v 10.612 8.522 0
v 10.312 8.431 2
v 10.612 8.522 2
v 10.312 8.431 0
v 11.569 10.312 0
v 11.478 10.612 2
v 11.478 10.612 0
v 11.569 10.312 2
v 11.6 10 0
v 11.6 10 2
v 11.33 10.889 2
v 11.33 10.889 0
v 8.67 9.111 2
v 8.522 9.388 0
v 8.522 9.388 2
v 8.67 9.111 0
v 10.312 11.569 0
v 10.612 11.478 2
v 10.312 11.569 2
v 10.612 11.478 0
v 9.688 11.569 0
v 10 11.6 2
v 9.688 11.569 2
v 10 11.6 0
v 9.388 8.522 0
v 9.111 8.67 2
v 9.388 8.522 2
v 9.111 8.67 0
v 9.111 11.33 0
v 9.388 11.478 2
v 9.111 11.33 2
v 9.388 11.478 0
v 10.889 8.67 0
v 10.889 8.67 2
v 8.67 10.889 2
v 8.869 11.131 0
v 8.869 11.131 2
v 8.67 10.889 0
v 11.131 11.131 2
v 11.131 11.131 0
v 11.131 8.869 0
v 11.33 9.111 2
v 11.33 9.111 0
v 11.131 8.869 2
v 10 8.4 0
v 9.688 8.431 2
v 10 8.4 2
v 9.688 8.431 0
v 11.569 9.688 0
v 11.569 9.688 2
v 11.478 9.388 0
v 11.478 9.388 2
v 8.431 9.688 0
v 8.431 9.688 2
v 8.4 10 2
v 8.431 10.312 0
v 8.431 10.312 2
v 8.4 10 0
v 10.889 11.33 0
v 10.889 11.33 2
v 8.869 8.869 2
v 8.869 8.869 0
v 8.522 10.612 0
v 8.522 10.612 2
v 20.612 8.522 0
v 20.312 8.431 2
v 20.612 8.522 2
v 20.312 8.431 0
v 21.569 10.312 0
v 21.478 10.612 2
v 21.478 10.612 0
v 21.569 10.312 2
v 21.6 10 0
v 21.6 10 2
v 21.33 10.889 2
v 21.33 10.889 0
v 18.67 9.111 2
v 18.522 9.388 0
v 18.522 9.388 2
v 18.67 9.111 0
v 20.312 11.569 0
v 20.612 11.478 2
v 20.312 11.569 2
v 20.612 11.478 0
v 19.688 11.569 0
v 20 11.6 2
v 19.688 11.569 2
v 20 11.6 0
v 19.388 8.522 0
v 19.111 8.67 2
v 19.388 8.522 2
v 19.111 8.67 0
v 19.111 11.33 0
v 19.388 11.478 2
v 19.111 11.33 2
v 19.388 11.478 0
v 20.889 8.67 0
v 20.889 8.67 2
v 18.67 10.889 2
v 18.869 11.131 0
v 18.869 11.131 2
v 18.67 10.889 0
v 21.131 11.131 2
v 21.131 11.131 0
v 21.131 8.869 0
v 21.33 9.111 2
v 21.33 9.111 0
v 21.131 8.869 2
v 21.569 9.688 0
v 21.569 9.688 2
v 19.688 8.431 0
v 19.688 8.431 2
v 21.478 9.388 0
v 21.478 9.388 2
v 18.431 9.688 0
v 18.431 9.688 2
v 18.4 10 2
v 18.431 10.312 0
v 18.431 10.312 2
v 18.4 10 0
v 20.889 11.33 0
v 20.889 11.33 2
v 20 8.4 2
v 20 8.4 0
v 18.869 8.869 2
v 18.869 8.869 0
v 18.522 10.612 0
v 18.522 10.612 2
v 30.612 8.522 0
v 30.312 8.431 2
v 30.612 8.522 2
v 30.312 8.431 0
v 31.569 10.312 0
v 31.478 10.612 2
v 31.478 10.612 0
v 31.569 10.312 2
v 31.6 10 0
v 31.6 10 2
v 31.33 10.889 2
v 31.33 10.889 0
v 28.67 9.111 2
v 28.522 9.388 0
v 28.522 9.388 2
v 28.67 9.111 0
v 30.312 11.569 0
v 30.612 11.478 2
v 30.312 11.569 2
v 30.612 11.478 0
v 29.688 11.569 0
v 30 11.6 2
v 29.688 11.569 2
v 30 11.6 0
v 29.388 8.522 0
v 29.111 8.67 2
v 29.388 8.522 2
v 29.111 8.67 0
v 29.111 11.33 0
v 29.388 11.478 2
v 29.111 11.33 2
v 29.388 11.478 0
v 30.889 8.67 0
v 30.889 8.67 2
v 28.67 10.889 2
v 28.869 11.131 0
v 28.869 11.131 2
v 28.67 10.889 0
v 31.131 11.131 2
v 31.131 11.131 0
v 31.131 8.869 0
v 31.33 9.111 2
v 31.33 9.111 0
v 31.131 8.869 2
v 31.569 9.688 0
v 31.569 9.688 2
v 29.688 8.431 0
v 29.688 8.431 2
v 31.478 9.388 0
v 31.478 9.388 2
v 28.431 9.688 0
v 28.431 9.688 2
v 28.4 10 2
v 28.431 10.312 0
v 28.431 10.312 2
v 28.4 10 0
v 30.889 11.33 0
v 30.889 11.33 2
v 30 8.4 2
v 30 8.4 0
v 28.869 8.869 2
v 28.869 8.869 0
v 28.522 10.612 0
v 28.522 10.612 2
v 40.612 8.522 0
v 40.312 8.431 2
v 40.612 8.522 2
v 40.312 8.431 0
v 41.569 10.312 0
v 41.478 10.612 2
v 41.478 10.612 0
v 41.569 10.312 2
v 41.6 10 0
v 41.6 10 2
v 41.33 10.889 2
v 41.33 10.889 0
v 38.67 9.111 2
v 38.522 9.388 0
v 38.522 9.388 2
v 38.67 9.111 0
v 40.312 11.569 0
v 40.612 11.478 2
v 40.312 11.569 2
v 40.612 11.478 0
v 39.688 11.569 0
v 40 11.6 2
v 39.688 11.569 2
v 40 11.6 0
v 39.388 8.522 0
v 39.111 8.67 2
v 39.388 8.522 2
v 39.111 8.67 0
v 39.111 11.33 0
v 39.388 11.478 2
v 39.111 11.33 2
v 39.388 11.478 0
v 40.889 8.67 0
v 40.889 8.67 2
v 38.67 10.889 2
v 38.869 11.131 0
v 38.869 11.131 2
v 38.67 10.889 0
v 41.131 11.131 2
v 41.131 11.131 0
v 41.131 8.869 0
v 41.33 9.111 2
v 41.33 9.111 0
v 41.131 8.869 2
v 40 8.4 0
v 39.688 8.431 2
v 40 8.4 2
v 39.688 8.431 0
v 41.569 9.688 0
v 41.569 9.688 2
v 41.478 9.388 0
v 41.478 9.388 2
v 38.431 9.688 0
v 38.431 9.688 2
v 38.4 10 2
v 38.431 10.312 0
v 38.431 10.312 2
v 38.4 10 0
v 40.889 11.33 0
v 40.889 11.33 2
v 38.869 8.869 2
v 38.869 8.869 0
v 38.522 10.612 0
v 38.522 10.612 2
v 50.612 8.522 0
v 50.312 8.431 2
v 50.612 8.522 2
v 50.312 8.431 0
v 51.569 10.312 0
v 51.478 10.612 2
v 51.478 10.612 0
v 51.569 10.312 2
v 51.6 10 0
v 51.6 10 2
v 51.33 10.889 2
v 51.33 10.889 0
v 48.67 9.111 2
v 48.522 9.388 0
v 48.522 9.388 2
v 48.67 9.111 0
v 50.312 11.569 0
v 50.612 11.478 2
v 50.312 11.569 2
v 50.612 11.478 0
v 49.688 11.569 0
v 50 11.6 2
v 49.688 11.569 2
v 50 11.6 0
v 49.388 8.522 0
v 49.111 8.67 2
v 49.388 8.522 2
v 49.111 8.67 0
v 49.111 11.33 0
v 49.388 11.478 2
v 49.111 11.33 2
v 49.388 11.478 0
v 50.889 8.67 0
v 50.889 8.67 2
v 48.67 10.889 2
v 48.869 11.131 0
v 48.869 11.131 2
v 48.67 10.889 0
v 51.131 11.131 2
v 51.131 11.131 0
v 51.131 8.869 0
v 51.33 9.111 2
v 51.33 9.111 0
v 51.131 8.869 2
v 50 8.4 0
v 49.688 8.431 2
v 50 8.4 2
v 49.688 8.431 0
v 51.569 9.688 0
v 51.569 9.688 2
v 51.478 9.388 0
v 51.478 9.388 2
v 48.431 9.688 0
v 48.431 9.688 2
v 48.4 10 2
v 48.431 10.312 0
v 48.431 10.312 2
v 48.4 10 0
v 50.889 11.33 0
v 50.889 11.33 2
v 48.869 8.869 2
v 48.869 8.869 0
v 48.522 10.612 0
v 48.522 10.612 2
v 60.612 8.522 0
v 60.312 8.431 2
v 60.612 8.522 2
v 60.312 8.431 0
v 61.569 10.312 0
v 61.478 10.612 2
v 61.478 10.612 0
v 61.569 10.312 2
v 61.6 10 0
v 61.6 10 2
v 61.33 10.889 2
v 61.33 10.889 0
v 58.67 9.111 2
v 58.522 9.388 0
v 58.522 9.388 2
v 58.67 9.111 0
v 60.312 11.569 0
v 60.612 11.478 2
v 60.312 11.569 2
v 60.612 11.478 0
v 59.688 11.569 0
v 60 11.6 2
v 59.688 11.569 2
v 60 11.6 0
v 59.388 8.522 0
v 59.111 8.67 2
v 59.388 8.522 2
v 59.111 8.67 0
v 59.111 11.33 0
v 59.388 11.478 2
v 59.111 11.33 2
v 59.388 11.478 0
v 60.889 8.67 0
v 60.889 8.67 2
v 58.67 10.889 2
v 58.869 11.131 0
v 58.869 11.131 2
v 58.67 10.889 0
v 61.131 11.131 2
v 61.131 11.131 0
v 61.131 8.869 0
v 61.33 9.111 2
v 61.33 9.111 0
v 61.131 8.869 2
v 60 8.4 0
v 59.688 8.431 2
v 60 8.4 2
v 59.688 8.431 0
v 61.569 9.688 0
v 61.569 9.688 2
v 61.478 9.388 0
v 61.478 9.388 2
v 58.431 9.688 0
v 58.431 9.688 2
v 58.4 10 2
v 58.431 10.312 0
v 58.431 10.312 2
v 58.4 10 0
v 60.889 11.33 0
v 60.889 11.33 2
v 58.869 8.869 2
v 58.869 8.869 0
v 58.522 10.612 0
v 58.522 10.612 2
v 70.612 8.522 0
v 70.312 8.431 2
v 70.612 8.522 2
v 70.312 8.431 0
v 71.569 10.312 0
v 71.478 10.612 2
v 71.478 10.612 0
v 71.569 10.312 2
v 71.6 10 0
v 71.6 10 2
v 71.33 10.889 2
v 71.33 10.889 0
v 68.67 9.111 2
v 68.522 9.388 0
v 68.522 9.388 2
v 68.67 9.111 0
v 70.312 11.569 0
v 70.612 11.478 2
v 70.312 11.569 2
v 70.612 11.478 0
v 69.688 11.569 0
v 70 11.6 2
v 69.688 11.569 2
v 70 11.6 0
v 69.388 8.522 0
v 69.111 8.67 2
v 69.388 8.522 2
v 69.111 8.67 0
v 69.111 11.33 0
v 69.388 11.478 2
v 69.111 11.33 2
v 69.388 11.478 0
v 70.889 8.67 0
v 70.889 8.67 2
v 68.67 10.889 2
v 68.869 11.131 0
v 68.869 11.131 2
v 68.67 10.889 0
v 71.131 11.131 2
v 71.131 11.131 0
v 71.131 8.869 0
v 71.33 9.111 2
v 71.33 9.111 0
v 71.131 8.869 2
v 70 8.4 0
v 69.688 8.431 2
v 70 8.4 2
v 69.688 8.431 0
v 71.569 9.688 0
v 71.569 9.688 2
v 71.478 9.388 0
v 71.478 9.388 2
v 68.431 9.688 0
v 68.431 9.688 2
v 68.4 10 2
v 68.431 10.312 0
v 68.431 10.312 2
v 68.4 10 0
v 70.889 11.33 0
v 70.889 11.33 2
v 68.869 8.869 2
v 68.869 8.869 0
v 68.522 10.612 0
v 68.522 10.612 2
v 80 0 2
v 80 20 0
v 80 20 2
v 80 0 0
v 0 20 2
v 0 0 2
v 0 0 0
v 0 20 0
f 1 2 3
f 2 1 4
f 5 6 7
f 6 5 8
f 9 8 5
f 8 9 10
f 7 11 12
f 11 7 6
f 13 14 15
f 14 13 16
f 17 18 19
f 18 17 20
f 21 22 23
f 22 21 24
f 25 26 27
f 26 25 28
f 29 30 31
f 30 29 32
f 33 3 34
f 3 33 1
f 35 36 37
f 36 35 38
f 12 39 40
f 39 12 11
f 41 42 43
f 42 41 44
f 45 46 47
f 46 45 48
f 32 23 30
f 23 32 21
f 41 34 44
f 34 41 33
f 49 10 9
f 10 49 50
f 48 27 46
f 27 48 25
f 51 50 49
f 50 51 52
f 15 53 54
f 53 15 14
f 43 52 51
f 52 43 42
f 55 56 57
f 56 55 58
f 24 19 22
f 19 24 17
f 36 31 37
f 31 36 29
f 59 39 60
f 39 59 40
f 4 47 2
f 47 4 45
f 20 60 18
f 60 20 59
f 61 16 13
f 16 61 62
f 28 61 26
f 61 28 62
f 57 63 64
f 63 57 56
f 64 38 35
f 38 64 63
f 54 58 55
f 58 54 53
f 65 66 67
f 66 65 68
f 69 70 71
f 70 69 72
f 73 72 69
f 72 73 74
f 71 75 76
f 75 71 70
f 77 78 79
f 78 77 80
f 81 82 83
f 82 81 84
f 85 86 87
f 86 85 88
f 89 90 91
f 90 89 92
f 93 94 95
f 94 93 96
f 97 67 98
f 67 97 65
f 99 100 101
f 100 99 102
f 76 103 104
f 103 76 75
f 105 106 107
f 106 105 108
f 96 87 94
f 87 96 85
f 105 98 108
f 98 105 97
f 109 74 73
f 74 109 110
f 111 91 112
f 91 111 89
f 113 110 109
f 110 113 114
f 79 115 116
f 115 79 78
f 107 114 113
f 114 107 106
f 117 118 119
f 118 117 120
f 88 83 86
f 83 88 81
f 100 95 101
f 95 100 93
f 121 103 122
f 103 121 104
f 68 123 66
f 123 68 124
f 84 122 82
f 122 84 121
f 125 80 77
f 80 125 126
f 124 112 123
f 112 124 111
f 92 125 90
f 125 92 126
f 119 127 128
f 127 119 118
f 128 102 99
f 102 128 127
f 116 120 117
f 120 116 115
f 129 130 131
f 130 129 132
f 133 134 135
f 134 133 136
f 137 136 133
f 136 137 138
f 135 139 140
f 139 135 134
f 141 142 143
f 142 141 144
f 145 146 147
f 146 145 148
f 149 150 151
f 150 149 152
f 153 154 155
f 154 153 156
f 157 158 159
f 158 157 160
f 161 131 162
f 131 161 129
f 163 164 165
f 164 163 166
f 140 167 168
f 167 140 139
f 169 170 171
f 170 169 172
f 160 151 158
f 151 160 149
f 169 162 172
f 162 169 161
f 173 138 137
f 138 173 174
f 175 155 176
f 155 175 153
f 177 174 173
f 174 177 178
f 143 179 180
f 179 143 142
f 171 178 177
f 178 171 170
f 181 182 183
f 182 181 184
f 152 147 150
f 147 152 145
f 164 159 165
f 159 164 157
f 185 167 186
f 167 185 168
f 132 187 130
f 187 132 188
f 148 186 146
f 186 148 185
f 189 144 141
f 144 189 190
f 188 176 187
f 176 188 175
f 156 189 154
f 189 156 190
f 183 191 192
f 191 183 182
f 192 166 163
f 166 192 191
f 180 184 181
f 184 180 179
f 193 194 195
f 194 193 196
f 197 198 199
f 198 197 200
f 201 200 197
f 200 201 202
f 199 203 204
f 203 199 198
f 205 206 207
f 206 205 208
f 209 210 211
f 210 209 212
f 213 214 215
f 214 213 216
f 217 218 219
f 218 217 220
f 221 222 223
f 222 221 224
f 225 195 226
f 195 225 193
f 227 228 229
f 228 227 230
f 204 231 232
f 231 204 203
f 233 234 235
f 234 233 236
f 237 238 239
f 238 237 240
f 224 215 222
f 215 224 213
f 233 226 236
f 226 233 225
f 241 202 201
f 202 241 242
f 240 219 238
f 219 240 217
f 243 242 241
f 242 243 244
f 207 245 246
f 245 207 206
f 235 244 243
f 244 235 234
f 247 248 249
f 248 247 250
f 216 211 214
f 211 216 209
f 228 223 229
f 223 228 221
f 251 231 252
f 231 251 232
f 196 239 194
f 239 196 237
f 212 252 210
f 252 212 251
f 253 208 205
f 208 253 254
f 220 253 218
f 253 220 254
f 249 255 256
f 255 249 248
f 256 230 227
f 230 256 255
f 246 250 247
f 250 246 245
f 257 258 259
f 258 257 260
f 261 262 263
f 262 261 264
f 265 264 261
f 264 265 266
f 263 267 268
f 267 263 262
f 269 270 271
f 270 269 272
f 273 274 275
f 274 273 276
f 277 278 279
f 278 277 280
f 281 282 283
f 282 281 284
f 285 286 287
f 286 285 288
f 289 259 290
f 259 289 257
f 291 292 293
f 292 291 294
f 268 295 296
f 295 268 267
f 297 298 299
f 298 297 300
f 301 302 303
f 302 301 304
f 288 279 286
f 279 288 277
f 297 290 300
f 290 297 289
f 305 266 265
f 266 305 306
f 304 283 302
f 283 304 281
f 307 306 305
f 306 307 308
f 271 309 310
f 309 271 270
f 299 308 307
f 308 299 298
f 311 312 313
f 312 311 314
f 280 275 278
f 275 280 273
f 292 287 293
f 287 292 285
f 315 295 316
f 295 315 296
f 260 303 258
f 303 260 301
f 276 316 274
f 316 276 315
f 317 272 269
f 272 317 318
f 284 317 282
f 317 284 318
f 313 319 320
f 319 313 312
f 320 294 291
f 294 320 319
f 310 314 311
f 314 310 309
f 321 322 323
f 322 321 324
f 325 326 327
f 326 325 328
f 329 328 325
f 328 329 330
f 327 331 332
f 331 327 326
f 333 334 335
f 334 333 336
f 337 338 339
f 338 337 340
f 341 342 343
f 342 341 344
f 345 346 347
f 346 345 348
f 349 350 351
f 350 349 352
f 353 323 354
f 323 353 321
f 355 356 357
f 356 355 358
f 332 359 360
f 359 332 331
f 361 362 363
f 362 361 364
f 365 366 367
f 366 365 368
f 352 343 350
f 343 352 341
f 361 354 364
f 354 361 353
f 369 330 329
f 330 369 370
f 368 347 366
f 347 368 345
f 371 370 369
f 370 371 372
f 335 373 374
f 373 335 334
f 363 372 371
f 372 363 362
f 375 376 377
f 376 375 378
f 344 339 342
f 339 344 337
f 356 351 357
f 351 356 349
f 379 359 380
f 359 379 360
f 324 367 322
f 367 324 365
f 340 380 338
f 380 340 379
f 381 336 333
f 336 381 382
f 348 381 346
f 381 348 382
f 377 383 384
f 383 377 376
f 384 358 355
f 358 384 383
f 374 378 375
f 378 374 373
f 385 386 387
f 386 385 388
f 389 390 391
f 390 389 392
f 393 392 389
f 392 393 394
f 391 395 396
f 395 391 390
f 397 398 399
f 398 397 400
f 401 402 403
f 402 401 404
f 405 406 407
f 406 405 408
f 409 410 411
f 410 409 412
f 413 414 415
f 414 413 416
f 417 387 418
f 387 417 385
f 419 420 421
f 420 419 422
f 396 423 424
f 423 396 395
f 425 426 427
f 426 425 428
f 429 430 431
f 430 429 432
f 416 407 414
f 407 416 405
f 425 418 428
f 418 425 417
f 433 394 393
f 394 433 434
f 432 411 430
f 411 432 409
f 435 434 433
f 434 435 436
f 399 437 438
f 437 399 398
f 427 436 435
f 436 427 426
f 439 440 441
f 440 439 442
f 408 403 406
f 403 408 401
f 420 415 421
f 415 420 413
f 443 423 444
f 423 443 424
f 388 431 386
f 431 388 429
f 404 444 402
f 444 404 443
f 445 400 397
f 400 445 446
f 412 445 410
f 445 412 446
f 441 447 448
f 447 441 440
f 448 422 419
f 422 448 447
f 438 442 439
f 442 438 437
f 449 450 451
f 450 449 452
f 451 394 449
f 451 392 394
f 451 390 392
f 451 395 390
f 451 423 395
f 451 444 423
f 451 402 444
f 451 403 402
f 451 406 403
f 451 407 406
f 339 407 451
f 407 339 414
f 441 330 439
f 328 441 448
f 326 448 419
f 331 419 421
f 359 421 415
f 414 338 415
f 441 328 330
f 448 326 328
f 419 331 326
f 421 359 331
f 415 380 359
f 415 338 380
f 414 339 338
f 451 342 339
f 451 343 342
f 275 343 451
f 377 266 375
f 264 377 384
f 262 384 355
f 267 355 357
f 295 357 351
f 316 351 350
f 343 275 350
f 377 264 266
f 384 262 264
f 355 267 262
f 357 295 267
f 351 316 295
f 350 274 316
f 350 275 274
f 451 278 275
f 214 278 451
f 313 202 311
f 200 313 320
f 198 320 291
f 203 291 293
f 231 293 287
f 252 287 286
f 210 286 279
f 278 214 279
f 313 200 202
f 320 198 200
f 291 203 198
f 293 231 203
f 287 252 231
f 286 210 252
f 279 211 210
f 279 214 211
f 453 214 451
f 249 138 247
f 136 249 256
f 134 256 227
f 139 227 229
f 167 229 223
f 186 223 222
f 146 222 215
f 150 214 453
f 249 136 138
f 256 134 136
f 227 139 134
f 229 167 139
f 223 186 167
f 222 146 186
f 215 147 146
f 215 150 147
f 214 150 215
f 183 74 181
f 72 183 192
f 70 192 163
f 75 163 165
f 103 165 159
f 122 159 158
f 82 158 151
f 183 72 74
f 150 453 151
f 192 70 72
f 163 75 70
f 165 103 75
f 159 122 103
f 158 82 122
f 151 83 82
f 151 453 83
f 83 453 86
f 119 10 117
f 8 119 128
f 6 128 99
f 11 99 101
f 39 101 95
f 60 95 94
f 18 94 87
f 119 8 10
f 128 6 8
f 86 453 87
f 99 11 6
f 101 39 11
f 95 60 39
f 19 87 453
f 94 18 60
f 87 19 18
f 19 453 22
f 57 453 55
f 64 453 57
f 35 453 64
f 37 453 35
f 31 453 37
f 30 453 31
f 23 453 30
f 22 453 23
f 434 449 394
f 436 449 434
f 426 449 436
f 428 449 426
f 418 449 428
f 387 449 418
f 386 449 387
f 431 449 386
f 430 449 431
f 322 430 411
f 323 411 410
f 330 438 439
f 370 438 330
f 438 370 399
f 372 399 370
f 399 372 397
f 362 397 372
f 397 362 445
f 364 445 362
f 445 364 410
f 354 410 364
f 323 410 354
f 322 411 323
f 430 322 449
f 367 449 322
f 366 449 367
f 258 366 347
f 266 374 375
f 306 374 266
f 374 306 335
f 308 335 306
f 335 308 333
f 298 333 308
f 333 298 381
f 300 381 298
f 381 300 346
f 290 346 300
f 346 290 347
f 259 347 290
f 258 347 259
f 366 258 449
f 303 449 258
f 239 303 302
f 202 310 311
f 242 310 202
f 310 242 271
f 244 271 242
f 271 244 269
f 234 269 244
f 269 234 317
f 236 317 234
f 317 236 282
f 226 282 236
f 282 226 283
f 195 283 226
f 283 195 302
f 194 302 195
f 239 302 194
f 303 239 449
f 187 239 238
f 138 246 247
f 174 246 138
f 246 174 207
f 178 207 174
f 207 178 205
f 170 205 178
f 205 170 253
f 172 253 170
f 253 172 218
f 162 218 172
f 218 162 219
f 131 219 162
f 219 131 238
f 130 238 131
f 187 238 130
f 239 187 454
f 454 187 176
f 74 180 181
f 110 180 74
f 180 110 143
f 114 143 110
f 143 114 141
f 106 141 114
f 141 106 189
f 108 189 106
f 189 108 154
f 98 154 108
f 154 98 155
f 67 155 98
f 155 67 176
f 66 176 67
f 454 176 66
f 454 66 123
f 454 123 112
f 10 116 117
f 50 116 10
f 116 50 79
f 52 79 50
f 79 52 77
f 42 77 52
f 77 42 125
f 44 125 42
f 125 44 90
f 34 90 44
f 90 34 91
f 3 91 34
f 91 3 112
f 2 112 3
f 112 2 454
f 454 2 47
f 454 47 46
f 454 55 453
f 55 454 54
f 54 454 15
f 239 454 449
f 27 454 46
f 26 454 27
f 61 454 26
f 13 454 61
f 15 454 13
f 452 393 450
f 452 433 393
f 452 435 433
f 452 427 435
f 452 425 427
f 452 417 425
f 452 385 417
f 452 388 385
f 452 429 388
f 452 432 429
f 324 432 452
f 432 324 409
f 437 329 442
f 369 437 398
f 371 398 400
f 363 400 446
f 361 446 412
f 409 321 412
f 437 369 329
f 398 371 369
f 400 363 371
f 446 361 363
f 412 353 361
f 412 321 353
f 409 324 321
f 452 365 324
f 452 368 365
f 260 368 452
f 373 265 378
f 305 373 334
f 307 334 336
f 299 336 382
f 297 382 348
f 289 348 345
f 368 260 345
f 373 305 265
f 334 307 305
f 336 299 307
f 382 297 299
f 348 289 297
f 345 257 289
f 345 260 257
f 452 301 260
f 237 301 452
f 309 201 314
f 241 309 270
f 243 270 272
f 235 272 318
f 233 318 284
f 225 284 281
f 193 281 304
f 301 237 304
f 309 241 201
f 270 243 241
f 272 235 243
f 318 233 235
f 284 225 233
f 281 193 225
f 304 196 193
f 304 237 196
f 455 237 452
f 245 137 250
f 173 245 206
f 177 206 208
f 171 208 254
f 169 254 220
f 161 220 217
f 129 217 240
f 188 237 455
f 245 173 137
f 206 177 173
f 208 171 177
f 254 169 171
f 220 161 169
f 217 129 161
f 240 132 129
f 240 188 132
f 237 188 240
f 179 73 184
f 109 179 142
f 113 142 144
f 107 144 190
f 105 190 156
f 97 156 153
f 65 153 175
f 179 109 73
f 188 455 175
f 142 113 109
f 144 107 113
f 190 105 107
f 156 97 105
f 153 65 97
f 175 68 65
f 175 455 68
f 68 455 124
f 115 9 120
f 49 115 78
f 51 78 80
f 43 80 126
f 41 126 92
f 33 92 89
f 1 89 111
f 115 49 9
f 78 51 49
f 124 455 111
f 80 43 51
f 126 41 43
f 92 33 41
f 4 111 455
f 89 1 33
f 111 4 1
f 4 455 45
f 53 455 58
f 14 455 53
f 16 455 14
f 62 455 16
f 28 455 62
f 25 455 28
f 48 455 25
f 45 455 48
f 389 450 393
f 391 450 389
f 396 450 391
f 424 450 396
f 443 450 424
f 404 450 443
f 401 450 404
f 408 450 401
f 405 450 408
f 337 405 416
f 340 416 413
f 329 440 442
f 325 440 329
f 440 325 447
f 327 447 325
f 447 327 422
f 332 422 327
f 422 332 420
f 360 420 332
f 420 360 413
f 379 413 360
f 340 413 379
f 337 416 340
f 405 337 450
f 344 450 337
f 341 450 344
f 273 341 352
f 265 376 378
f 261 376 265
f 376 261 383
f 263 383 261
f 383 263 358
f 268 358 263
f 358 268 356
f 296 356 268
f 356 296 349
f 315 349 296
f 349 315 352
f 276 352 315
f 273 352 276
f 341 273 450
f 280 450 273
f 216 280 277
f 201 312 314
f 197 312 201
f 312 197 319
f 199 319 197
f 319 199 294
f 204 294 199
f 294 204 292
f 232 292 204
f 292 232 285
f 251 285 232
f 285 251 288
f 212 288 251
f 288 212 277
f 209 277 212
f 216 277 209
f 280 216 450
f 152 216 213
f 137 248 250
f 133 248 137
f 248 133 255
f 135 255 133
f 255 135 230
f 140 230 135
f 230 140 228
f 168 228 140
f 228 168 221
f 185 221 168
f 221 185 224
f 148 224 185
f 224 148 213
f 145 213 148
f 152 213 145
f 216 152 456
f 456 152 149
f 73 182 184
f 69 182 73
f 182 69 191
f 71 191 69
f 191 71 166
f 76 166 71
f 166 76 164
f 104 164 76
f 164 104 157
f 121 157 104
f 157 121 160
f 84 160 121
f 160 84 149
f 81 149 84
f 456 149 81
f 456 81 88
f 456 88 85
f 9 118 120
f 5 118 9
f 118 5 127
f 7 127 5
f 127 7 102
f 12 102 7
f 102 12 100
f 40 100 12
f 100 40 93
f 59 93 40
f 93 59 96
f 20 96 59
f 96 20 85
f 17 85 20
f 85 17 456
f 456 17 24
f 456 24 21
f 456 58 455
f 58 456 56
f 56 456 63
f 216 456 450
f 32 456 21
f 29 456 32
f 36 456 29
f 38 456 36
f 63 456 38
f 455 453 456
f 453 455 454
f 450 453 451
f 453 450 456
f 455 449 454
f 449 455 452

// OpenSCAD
// A1 PETG coupon: 80 x 20 x 2 mm, no support. Measure thickness and bridging
// after cooling before making functional parts.
difference() {
    cube([80, 20, 2]);
    for (x = [10:10:70]) translate([x, 10, -1]) cylinder(d = 3.2, h = 4, $fn = 32);
}
